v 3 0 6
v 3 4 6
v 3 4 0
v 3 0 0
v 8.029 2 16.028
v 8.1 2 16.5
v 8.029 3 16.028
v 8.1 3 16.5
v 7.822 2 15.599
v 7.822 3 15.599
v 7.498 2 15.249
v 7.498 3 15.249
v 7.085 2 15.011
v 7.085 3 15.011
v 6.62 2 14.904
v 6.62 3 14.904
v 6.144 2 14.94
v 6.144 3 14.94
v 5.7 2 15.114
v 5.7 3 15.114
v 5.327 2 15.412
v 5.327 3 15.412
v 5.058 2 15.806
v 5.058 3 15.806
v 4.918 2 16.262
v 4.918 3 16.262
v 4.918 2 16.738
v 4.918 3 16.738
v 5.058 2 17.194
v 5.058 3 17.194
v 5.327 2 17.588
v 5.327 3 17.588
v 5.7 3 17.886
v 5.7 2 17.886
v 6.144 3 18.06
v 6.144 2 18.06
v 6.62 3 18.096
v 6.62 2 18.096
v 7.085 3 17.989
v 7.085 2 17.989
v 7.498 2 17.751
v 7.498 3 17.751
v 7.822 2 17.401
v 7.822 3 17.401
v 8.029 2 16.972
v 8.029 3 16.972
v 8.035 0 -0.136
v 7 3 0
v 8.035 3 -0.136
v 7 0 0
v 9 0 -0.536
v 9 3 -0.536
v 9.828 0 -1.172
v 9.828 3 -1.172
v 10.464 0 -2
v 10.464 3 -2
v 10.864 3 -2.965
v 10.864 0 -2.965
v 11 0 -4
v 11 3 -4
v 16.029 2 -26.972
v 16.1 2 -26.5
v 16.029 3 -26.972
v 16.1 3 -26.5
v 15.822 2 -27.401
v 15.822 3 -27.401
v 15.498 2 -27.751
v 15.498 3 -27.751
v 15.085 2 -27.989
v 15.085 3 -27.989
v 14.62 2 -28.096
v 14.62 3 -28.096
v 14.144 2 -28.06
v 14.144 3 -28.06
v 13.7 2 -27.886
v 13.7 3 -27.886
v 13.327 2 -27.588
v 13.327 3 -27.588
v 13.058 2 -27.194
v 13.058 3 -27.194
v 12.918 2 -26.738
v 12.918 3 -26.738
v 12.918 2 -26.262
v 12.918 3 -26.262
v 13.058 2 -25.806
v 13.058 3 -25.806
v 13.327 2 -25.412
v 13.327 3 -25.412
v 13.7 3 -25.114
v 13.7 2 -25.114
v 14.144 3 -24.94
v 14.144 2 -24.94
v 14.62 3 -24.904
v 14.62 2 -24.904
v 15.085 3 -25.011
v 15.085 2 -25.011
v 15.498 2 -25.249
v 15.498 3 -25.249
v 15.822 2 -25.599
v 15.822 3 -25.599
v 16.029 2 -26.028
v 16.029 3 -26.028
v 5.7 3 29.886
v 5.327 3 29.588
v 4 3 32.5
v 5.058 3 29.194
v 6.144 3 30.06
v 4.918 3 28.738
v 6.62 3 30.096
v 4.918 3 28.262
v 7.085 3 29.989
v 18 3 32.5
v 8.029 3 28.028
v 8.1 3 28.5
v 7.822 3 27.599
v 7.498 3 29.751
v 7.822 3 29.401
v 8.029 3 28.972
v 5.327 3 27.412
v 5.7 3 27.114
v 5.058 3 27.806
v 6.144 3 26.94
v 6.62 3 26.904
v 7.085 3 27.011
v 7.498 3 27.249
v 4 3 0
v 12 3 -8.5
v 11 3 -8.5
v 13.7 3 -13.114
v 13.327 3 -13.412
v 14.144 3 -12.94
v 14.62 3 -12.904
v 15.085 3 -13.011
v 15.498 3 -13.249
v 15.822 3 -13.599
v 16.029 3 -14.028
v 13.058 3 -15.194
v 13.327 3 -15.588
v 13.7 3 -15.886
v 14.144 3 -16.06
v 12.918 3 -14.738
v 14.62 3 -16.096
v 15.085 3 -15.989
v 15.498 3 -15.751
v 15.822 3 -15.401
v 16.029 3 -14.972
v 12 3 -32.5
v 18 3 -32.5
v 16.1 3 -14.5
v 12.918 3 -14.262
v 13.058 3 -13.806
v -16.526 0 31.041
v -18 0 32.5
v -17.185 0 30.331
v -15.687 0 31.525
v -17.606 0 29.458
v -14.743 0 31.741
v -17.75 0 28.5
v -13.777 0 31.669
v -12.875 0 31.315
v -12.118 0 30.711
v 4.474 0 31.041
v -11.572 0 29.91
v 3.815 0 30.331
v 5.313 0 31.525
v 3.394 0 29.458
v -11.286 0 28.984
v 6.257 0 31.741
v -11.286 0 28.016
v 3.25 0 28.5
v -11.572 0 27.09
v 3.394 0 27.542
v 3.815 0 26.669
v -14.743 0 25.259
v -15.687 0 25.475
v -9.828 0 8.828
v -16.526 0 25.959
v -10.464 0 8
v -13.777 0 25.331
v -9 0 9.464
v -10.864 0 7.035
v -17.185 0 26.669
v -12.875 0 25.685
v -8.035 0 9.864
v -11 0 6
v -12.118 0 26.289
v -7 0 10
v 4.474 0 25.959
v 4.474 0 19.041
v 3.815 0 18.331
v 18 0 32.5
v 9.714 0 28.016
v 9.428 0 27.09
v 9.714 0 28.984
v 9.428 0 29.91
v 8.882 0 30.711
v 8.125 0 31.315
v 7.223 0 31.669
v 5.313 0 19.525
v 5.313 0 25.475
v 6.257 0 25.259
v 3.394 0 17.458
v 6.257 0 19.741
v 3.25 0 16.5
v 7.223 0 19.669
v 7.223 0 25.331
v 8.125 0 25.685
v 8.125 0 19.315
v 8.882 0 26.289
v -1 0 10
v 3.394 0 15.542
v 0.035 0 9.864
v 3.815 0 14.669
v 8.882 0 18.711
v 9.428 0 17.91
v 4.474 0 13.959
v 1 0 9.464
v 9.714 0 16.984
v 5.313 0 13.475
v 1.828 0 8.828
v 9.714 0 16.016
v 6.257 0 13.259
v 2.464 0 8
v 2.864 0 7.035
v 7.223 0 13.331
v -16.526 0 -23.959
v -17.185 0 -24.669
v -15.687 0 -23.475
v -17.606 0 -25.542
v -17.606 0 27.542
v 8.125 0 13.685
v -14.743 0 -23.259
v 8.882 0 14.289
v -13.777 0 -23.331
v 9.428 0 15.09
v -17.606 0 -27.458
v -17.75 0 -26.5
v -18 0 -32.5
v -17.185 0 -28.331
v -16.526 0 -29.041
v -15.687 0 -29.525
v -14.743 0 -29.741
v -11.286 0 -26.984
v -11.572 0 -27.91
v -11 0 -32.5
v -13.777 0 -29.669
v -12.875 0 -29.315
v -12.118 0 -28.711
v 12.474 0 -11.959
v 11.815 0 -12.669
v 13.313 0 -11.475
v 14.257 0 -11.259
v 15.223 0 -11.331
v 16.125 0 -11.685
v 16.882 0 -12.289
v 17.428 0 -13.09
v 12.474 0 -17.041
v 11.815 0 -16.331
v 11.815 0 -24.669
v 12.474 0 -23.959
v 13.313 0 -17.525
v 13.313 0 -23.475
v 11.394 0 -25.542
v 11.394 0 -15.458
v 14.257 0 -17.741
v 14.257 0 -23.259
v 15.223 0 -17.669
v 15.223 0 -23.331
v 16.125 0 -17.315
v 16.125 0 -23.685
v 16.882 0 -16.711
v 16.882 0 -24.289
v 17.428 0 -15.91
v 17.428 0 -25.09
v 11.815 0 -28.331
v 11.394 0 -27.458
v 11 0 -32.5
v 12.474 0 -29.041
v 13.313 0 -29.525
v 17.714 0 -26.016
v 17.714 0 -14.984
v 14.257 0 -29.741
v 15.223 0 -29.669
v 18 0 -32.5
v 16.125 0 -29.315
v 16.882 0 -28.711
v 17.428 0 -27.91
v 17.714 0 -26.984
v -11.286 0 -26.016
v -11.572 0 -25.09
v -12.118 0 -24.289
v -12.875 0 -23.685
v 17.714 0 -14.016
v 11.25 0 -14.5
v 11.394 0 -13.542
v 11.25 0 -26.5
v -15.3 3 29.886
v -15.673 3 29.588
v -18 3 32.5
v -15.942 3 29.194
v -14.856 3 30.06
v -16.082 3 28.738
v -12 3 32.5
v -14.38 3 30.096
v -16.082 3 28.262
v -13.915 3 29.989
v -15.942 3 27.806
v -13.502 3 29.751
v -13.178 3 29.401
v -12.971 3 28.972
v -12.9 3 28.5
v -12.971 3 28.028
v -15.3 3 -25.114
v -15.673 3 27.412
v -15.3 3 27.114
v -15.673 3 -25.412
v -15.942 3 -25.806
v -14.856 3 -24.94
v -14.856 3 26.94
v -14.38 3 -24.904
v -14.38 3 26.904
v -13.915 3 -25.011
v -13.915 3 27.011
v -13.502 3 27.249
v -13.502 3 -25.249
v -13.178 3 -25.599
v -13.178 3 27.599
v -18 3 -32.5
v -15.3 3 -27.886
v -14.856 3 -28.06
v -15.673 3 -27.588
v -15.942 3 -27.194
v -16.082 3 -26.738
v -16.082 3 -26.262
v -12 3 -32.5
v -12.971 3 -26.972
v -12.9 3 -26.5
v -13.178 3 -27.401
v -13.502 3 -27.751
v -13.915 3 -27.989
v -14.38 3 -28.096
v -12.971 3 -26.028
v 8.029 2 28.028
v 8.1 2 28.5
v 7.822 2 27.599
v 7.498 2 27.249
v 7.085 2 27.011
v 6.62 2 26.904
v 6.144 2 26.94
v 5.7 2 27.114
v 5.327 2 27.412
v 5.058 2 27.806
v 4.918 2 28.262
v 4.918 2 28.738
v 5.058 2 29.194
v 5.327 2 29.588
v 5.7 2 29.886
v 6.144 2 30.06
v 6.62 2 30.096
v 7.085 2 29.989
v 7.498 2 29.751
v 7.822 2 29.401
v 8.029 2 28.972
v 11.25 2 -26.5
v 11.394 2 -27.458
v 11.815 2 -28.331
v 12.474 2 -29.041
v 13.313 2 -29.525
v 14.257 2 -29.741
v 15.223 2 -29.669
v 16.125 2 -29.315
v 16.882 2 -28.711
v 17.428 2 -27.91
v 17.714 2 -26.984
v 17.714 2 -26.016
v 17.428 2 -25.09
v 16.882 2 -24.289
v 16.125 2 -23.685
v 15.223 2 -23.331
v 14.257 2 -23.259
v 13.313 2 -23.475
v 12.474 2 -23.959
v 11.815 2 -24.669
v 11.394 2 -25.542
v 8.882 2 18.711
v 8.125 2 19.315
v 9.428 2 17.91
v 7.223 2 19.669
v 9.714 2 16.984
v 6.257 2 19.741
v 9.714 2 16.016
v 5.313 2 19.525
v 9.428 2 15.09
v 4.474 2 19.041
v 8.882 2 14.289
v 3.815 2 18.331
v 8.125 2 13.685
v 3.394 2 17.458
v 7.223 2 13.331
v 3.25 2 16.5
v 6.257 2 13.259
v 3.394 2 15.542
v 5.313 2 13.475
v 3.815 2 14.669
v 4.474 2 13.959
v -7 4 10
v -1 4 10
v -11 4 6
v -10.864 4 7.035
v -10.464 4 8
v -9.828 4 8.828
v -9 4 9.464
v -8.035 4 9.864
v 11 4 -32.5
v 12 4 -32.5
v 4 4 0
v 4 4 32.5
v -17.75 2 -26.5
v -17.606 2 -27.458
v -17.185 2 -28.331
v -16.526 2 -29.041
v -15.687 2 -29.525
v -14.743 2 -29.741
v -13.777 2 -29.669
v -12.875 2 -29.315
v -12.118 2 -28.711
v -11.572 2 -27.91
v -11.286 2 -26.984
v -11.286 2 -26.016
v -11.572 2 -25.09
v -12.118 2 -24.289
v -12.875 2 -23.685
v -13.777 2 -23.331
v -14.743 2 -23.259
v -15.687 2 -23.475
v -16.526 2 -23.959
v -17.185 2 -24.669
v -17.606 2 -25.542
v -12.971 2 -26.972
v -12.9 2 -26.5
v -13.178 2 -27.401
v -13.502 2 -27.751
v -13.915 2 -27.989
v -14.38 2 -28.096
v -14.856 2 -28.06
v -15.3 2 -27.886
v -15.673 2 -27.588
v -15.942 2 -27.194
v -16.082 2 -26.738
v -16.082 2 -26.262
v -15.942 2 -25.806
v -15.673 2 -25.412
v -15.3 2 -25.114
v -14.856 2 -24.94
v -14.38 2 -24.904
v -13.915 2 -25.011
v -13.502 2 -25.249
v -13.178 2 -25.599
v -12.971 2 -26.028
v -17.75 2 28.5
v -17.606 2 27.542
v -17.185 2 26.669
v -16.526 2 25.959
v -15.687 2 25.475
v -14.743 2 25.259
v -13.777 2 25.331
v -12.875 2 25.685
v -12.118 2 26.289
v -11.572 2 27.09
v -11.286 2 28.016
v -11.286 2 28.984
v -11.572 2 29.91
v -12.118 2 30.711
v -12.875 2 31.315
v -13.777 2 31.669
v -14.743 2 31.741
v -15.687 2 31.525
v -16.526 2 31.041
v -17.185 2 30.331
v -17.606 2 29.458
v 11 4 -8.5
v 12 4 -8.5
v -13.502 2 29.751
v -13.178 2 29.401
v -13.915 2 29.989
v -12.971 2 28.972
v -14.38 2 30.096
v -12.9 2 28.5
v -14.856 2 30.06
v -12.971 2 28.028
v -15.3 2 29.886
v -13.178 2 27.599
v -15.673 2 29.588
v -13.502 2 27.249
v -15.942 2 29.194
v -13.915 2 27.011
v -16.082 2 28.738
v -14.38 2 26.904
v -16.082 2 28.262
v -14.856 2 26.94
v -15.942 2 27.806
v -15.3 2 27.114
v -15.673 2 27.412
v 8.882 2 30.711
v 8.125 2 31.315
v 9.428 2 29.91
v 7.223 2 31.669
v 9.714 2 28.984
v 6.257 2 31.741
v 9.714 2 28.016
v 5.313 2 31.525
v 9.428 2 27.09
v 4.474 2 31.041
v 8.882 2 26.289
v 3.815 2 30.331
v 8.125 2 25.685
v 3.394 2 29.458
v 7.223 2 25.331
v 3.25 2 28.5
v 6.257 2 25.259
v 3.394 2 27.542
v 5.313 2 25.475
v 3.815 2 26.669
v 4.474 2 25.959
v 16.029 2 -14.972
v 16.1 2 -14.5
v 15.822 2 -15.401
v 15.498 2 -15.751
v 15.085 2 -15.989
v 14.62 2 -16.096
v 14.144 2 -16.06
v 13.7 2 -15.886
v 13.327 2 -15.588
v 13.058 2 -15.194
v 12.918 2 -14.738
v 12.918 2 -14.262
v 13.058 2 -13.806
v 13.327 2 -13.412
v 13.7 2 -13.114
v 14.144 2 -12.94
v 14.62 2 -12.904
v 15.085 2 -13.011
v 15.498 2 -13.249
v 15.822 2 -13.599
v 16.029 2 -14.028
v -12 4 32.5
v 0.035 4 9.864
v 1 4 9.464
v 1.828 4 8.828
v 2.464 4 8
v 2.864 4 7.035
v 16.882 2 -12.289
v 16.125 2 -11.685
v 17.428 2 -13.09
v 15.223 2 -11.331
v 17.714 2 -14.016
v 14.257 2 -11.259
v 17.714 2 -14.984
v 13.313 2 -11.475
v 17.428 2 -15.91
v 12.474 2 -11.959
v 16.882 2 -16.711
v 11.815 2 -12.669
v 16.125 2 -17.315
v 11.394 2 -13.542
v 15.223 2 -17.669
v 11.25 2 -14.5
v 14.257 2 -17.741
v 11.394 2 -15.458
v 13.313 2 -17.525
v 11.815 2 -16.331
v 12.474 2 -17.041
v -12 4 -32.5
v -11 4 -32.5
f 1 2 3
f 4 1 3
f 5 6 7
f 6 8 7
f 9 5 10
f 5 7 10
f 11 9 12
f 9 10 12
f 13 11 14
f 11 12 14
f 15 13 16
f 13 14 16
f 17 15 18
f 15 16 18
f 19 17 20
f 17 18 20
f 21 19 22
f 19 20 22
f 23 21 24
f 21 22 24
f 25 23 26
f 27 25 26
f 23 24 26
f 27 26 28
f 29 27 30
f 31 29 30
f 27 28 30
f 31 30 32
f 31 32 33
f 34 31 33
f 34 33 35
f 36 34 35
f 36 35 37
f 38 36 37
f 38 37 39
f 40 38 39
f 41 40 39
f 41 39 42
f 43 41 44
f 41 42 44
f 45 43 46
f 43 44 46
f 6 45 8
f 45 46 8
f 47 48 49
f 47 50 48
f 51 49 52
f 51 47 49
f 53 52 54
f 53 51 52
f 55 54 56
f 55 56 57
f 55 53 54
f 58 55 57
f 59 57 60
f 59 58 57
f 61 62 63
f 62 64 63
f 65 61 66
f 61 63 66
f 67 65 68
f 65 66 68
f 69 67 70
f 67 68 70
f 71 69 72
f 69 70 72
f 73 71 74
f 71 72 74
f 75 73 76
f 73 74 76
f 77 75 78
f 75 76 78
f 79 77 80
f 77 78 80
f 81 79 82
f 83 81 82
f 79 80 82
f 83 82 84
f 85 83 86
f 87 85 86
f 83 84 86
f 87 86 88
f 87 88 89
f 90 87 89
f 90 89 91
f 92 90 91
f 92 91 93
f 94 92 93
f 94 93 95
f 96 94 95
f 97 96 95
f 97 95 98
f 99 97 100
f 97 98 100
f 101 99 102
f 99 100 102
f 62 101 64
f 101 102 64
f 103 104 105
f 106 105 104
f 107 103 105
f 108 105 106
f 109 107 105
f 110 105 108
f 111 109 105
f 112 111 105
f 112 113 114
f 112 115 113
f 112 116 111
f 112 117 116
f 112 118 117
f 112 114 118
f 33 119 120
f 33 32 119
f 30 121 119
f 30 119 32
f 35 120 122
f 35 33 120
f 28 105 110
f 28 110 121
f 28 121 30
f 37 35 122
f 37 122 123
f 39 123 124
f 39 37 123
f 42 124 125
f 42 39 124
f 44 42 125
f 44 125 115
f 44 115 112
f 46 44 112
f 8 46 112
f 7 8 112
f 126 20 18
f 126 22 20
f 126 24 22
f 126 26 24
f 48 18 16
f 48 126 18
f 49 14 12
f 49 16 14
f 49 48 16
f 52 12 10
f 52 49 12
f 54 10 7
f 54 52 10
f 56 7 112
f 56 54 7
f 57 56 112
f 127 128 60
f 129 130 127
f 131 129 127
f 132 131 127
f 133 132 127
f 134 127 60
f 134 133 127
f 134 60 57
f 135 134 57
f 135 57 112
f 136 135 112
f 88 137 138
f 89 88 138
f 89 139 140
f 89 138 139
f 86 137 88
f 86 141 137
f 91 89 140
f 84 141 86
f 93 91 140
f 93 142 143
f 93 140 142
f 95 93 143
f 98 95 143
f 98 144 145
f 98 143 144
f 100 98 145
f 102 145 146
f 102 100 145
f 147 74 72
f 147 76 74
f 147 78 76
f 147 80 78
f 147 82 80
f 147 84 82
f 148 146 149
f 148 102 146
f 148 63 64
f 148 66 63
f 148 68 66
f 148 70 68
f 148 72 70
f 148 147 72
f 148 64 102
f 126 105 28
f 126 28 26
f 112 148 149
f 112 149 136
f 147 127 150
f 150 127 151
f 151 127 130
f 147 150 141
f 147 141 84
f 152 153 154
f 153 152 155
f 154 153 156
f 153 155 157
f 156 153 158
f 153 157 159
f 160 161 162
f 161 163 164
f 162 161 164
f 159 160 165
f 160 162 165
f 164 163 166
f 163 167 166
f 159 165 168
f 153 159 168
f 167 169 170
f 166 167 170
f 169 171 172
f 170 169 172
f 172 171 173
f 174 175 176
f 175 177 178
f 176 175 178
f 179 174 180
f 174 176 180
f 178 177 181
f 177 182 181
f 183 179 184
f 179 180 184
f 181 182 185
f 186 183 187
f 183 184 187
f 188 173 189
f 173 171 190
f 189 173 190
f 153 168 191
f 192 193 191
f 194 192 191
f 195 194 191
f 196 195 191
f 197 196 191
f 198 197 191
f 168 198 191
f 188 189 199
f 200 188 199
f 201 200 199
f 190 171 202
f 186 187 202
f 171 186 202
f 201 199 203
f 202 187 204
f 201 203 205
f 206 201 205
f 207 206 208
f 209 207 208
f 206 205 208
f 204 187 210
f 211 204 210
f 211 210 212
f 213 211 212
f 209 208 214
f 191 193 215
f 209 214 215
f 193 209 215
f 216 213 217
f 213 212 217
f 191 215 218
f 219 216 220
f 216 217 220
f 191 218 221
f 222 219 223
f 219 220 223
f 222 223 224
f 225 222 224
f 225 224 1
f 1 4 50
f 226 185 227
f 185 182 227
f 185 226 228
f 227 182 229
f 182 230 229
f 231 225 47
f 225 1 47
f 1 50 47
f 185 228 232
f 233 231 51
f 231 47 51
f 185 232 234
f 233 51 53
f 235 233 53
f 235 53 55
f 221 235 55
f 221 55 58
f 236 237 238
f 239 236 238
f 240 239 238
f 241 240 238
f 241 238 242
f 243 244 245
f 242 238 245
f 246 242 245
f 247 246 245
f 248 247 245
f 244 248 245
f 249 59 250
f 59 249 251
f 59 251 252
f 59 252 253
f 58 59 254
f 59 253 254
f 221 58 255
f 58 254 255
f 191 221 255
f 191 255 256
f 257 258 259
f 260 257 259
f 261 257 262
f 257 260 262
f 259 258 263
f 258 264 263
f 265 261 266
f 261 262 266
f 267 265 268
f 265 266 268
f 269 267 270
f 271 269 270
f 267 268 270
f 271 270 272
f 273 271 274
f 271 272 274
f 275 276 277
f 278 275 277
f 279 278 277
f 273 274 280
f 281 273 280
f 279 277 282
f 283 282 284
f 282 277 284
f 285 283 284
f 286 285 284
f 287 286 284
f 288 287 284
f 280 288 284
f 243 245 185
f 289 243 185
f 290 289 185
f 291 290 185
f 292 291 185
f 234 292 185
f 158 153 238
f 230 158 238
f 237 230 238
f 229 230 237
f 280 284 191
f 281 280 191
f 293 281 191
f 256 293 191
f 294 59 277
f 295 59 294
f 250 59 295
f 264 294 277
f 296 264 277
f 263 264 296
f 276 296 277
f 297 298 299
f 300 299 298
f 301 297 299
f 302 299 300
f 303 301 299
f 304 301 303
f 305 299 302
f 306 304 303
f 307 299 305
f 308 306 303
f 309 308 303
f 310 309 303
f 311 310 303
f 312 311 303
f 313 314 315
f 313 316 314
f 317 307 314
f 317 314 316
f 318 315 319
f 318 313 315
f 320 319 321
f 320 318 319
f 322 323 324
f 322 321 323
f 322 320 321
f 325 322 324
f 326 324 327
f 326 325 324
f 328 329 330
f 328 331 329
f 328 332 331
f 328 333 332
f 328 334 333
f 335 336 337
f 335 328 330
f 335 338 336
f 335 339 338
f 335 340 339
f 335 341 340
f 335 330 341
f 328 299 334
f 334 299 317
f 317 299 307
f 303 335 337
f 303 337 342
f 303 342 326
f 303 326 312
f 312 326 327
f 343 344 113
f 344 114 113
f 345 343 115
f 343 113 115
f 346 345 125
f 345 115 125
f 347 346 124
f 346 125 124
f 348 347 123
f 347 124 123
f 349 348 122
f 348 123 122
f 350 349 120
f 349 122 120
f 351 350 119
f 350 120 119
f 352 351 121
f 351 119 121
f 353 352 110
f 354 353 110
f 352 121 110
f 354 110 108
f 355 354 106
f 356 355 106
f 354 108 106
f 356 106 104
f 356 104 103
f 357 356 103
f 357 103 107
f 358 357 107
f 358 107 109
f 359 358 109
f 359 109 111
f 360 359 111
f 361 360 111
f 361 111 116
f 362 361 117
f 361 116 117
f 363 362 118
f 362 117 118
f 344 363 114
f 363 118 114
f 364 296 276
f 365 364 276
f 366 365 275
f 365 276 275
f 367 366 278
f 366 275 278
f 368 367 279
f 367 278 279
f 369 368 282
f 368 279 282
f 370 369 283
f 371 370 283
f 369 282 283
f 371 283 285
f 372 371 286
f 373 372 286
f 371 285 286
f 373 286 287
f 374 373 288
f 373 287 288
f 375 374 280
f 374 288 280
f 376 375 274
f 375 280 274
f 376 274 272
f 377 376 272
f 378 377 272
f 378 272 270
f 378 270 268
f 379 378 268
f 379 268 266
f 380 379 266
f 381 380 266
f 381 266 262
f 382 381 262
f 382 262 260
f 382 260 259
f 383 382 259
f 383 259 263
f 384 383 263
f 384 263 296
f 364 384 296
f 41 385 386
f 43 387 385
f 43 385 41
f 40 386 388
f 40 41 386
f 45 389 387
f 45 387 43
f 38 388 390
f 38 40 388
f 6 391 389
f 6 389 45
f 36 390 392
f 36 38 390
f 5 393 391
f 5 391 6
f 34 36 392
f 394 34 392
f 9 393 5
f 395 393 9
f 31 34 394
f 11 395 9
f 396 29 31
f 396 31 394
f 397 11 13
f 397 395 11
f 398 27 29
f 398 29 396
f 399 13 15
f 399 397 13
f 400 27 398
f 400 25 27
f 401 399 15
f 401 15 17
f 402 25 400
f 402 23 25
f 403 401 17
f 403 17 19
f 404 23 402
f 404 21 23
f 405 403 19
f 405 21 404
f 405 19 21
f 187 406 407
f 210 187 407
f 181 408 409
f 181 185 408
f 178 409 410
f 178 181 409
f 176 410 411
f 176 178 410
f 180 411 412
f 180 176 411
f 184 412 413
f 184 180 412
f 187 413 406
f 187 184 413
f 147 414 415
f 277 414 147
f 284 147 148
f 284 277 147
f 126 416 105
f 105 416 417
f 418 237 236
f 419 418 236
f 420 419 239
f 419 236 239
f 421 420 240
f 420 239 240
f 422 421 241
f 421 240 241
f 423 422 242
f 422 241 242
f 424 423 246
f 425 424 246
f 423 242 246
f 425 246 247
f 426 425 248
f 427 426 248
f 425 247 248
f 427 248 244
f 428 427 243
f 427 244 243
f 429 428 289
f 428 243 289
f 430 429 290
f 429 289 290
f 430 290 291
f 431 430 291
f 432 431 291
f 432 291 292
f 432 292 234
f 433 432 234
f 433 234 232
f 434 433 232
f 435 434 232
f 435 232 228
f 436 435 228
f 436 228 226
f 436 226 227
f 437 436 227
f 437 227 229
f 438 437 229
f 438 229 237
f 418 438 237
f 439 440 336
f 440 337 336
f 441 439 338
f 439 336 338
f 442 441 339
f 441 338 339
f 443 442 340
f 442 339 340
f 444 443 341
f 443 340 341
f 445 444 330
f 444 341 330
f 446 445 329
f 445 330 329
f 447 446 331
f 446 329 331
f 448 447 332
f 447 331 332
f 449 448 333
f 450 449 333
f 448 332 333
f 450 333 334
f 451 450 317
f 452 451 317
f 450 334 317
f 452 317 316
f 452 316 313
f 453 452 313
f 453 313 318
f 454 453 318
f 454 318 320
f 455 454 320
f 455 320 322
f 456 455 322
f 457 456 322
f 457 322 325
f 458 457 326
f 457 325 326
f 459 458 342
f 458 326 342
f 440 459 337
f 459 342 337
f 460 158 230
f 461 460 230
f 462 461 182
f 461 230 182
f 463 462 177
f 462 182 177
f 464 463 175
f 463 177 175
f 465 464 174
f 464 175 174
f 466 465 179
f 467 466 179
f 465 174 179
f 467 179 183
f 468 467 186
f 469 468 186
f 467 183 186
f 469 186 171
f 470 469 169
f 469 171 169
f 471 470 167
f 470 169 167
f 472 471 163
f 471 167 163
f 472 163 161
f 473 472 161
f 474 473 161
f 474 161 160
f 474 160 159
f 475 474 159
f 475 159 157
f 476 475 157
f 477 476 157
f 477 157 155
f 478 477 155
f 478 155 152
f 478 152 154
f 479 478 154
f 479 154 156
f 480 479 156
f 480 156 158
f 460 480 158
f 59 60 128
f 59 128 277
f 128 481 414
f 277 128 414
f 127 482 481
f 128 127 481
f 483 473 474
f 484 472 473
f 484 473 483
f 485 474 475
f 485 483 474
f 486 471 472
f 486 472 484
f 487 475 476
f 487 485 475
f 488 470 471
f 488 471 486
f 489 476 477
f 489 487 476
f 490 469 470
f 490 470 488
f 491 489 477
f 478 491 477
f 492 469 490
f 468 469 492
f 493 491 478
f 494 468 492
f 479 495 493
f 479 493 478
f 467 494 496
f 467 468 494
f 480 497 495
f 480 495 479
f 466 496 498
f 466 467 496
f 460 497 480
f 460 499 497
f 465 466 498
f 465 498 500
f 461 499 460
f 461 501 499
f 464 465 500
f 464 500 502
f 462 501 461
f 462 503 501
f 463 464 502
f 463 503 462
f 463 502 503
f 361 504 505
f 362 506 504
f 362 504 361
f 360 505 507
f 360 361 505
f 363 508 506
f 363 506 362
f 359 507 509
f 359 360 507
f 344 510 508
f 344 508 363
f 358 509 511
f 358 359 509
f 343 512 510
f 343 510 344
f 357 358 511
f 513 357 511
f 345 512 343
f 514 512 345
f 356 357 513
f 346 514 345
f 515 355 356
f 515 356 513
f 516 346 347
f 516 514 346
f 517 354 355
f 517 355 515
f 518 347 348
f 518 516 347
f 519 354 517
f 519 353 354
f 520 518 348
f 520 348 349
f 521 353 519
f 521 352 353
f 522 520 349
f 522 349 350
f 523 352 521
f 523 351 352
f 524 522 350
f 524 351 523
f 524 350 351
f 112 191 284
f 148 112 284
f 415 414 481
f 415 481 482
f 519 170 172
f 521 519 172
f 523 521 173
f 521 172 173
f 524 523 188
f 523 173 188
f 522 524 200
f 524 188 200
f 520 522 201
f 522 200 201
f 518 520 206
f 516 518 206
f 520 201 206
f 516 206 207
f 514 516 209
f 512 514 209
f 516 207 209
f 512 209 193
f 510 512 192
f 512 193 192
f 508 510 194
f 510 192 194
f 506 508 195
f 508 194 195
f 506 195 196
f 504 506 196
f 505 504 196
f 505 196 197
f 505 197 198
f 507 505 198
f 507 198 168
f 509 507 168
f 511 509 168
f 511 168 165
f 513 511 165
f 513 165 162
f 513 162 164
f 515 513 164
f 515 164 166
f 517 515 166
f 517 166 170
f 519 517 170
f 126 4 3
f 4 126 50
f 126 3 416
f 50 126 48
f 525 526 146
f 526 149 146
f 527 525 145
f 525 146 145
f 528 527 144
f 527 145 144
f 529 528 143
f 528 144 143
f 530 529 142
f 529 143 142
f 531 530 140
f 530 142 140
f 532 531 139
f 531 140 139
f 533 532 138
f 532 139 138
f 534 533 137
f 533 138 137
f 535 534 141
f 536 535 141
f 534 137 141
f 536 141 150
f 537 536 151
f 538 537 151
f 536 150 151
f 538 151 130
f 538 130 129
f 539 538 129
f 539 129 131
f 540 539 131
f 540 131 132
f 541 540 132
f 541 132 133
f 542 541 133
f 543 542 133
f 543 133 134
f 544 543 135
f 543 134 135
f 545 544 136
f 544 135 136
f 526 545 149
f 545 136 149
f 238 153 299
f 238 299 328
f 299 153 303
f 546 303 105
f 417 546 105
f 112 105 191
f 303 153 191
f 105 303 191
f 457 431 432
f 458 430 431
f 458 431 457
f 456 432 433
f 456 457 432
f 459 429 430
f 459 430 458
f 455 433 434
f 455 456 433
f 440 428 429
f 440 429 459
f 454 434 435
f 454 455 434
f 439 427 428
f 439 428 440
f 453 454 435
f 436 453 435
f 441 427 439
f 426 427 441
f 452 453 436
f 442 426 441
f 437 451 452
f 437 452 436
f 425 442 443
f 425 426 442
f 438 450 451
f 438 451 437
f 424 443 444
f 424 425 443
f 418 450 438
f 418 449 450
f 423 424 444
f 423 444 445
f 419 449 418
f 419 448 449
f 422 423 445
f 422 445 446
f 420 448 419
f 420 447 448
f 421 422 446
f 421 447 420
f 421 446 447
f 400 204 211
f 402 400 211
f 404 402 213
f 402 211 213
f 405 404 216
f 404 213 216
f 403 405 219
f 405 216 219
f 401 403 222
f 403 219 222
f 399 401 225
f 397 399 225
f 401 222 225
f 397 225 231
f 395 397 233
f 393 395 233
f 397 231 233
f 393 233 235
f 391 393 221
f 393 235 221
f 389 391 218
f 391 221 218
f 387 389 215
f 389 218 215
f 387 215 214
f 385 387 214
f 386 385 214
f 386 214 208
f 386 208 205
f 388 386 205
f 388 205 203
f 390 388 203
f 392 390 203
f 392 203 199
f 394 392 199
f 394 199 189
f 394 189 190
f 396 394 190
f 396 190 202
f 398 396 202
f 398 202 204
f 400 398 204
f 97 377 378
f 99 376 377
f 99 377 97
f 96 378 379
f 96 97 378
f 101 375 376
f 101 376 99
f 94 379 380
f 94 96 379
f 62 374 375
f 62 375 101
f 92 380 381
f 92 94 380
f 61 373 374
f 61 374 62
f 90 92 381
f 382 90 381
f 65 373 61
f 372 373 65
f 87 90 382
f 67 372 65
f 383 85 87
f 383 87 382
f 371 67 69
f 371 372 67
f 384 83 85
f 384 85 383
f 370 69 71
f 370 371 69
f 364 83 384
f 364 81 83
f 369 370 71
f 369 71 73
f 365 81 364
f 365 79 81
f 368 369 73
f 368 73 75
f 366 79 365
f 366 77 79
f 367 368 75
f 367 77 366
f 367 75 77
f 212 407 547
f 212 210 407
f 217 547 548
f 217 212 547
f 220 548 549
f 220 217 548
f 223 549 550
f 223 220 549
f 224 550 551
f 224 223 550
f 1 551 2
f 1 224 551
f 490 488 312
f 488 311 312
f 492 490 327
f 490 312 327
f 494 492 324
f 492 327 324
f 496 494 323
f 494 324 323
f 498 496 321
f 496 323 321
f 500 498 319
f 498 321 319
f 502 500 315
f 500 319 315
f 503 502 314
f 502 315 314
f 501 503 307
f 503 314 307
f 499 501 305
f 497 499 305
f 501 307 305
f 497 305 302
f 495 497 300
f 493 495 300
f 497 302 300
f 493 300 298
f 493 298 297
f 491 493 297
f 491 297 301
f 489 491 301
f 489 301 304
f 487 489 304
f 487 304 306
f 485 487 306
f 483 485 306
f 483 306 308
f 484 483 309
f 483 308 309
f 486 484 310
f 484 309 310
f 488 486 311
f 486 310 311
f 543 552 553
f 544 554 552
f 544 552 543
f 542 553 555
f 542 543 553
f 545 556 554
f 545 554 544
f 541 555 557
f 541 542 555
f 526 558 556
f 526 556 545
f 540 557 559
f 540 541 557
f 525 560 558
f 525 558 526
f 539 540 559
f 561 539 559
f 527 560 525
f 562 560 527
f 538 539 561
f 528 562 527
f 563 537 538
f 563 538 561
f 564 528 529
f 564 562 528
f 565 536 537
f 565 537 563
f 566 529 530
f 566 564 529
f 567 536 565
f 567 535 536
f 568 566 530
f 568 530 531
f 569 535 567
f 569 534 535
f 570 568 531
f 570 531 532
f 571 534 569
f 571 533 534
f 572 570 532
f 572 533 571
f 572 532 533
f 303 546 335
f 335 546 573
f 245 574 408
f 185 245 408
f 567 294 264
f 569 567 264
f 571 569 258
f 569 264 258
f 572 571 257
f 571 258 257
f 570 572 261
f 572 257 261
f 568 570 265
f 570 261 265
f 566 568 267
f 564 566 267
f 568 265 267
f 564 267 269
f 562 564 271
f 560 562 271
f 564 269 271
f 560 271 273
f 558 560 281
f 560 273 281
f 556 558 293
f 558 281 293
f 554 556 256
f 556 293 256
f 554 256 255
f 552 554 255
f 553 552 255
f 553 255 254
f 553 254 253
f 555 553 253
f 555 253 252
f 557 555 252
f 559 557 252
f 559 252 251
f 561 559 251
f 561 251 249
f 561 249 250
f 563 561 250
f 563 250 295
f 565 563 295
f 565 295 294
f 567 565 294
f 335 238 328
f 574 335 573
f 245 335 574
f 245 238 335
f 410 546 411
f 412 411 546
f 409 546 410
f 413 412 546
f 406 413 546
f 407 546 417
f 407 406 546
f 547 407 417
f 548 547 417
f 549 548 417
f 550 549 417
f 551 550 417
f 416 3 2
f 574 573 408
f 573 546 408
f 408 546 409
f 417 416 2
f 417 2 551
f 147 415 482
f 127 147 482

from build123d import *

# Parameters (mm, degrees)
SKIZZE1_W                                            = 36
SKIZZE1_H                                            = 65
AUFSATZ_LINEAR_AUSTRAGEN1_DEPTH                      = 4
SKIZZE2_W                                            = 6
SKIZZE2_H                                            = 65
SCHNITT_LINEAR_AUSTRAGEN1_DEPTH                      = 1
SKIZZE2_3_W                                          = 14
SKIZZE2_3_H                                          = 10
SCHNITT_LINEAR_AUSTRAGEN2_DEPTH                      = 38.366428783
VERRUNDUNG1_R                                        = 4
STIRNSENKUNG_F_R_M3_ZYLINDERSCHRAUBE_MIT_D           = 3.2
STIRNSENKUNG_F_R_M3_ZYLINDERSCHRAUBE_MIT_CBORE_D     = 6.5
STIRNSENKUNG_F_R_M3_ZYLINDERSCHRAUBE_MIT_CBORE_DEPTH = 2


with BuildPart() as part:
    # Skizze1 → Aufsatz-Linear austragen1 (new body)
    with BuildSketch(Plane(origin=(0, 0, 0), x_dir=(1, 0, 0), z_dir=(0, 1, 0))):
        Rectangle(SKIZZE1_W, SKIZZE1_H)
    extrude(amount=AUFSATZ_LINEAR_AUSTRAGEN1_DEPTH)

    # Skizze2 → Schnitt-Linear austragen1 (cut)
    with BuildSketch(Plane(origin=(0, 4, 0), x_dir=(1, 0, 0), z_dir=(0, 1, 0))):
        with Locations((-15, 0)):
            Rectangle(SKIZZE2_W, SKIZZE2_H)
        Polygon((18, 32.5), (12, 32.5), (12, 8.5), (4, 8.5), (4, -32.5), (18, -32.5), align=None)
    extrude(amount=-SCHNITT_LINEAR_AUSTRAGEN1_DEPTH, mode=Mode.SUBTRACT)

    # Skizze2<3> → Schnitt-Linear austragen2 (cut, through all)
    with BuildSketch(Plane(origin=(0, 4, 0), x_dir=(1, 0, 0), z_dir=(0, 1, 0))):
        Polygon((11, 32.5), (-11, 32.5), (-11, 0), (3, 0), (11, 0), align=None)
        with Locations((-4, -5)):
            Rectangle(SKIZZE2_3_W, SKIZZE2_3_H)
    extrude(amount=-SCHNITT_LINEAR_AUSTRAGEN2_DEPTH, mode=Mode.SUBTRACT)

    # Verrundung1
    verrundung1_edges = [part.edges().sort_by_distance(p)[0] for p in [
        (11, 1.5, 0),
        (3, 2, 10),
        (-11, 2, 10),
    ]]
    fillet(verrundung1_edges, radius=VERRUNDUNG1_R)

    # Stirnsenkung für  M3 Zylinderschraube mit Schlitz/Kreuzschlitz1 (through all)
    with Locations(Plane(origin=(0, 0, 0), x_dir=(-1, 0, 0), z_dir=(0, -1, 0))):
        with Locations((14.5, -28.5), (14.5, 26.5), (-14.5, 26.5), (-6.5, -28.5), (-6.5, -16.5), (-14.5, 14.5)):
            CounterBoreHole(STIRNSENKUNG_F_R_M3_ZYLINDERSCHRAUBE_MIT_D / 2, STIRNSENKUNG_F_R_M3_ZYLINDERSCHRAUBE_MIT_CBORE_D / 2, STIRNSENKUNG_F_R_M3_ZYLINDERSCHRAUBE_MIT_CBORE_DEPTH)


solid = part.part
